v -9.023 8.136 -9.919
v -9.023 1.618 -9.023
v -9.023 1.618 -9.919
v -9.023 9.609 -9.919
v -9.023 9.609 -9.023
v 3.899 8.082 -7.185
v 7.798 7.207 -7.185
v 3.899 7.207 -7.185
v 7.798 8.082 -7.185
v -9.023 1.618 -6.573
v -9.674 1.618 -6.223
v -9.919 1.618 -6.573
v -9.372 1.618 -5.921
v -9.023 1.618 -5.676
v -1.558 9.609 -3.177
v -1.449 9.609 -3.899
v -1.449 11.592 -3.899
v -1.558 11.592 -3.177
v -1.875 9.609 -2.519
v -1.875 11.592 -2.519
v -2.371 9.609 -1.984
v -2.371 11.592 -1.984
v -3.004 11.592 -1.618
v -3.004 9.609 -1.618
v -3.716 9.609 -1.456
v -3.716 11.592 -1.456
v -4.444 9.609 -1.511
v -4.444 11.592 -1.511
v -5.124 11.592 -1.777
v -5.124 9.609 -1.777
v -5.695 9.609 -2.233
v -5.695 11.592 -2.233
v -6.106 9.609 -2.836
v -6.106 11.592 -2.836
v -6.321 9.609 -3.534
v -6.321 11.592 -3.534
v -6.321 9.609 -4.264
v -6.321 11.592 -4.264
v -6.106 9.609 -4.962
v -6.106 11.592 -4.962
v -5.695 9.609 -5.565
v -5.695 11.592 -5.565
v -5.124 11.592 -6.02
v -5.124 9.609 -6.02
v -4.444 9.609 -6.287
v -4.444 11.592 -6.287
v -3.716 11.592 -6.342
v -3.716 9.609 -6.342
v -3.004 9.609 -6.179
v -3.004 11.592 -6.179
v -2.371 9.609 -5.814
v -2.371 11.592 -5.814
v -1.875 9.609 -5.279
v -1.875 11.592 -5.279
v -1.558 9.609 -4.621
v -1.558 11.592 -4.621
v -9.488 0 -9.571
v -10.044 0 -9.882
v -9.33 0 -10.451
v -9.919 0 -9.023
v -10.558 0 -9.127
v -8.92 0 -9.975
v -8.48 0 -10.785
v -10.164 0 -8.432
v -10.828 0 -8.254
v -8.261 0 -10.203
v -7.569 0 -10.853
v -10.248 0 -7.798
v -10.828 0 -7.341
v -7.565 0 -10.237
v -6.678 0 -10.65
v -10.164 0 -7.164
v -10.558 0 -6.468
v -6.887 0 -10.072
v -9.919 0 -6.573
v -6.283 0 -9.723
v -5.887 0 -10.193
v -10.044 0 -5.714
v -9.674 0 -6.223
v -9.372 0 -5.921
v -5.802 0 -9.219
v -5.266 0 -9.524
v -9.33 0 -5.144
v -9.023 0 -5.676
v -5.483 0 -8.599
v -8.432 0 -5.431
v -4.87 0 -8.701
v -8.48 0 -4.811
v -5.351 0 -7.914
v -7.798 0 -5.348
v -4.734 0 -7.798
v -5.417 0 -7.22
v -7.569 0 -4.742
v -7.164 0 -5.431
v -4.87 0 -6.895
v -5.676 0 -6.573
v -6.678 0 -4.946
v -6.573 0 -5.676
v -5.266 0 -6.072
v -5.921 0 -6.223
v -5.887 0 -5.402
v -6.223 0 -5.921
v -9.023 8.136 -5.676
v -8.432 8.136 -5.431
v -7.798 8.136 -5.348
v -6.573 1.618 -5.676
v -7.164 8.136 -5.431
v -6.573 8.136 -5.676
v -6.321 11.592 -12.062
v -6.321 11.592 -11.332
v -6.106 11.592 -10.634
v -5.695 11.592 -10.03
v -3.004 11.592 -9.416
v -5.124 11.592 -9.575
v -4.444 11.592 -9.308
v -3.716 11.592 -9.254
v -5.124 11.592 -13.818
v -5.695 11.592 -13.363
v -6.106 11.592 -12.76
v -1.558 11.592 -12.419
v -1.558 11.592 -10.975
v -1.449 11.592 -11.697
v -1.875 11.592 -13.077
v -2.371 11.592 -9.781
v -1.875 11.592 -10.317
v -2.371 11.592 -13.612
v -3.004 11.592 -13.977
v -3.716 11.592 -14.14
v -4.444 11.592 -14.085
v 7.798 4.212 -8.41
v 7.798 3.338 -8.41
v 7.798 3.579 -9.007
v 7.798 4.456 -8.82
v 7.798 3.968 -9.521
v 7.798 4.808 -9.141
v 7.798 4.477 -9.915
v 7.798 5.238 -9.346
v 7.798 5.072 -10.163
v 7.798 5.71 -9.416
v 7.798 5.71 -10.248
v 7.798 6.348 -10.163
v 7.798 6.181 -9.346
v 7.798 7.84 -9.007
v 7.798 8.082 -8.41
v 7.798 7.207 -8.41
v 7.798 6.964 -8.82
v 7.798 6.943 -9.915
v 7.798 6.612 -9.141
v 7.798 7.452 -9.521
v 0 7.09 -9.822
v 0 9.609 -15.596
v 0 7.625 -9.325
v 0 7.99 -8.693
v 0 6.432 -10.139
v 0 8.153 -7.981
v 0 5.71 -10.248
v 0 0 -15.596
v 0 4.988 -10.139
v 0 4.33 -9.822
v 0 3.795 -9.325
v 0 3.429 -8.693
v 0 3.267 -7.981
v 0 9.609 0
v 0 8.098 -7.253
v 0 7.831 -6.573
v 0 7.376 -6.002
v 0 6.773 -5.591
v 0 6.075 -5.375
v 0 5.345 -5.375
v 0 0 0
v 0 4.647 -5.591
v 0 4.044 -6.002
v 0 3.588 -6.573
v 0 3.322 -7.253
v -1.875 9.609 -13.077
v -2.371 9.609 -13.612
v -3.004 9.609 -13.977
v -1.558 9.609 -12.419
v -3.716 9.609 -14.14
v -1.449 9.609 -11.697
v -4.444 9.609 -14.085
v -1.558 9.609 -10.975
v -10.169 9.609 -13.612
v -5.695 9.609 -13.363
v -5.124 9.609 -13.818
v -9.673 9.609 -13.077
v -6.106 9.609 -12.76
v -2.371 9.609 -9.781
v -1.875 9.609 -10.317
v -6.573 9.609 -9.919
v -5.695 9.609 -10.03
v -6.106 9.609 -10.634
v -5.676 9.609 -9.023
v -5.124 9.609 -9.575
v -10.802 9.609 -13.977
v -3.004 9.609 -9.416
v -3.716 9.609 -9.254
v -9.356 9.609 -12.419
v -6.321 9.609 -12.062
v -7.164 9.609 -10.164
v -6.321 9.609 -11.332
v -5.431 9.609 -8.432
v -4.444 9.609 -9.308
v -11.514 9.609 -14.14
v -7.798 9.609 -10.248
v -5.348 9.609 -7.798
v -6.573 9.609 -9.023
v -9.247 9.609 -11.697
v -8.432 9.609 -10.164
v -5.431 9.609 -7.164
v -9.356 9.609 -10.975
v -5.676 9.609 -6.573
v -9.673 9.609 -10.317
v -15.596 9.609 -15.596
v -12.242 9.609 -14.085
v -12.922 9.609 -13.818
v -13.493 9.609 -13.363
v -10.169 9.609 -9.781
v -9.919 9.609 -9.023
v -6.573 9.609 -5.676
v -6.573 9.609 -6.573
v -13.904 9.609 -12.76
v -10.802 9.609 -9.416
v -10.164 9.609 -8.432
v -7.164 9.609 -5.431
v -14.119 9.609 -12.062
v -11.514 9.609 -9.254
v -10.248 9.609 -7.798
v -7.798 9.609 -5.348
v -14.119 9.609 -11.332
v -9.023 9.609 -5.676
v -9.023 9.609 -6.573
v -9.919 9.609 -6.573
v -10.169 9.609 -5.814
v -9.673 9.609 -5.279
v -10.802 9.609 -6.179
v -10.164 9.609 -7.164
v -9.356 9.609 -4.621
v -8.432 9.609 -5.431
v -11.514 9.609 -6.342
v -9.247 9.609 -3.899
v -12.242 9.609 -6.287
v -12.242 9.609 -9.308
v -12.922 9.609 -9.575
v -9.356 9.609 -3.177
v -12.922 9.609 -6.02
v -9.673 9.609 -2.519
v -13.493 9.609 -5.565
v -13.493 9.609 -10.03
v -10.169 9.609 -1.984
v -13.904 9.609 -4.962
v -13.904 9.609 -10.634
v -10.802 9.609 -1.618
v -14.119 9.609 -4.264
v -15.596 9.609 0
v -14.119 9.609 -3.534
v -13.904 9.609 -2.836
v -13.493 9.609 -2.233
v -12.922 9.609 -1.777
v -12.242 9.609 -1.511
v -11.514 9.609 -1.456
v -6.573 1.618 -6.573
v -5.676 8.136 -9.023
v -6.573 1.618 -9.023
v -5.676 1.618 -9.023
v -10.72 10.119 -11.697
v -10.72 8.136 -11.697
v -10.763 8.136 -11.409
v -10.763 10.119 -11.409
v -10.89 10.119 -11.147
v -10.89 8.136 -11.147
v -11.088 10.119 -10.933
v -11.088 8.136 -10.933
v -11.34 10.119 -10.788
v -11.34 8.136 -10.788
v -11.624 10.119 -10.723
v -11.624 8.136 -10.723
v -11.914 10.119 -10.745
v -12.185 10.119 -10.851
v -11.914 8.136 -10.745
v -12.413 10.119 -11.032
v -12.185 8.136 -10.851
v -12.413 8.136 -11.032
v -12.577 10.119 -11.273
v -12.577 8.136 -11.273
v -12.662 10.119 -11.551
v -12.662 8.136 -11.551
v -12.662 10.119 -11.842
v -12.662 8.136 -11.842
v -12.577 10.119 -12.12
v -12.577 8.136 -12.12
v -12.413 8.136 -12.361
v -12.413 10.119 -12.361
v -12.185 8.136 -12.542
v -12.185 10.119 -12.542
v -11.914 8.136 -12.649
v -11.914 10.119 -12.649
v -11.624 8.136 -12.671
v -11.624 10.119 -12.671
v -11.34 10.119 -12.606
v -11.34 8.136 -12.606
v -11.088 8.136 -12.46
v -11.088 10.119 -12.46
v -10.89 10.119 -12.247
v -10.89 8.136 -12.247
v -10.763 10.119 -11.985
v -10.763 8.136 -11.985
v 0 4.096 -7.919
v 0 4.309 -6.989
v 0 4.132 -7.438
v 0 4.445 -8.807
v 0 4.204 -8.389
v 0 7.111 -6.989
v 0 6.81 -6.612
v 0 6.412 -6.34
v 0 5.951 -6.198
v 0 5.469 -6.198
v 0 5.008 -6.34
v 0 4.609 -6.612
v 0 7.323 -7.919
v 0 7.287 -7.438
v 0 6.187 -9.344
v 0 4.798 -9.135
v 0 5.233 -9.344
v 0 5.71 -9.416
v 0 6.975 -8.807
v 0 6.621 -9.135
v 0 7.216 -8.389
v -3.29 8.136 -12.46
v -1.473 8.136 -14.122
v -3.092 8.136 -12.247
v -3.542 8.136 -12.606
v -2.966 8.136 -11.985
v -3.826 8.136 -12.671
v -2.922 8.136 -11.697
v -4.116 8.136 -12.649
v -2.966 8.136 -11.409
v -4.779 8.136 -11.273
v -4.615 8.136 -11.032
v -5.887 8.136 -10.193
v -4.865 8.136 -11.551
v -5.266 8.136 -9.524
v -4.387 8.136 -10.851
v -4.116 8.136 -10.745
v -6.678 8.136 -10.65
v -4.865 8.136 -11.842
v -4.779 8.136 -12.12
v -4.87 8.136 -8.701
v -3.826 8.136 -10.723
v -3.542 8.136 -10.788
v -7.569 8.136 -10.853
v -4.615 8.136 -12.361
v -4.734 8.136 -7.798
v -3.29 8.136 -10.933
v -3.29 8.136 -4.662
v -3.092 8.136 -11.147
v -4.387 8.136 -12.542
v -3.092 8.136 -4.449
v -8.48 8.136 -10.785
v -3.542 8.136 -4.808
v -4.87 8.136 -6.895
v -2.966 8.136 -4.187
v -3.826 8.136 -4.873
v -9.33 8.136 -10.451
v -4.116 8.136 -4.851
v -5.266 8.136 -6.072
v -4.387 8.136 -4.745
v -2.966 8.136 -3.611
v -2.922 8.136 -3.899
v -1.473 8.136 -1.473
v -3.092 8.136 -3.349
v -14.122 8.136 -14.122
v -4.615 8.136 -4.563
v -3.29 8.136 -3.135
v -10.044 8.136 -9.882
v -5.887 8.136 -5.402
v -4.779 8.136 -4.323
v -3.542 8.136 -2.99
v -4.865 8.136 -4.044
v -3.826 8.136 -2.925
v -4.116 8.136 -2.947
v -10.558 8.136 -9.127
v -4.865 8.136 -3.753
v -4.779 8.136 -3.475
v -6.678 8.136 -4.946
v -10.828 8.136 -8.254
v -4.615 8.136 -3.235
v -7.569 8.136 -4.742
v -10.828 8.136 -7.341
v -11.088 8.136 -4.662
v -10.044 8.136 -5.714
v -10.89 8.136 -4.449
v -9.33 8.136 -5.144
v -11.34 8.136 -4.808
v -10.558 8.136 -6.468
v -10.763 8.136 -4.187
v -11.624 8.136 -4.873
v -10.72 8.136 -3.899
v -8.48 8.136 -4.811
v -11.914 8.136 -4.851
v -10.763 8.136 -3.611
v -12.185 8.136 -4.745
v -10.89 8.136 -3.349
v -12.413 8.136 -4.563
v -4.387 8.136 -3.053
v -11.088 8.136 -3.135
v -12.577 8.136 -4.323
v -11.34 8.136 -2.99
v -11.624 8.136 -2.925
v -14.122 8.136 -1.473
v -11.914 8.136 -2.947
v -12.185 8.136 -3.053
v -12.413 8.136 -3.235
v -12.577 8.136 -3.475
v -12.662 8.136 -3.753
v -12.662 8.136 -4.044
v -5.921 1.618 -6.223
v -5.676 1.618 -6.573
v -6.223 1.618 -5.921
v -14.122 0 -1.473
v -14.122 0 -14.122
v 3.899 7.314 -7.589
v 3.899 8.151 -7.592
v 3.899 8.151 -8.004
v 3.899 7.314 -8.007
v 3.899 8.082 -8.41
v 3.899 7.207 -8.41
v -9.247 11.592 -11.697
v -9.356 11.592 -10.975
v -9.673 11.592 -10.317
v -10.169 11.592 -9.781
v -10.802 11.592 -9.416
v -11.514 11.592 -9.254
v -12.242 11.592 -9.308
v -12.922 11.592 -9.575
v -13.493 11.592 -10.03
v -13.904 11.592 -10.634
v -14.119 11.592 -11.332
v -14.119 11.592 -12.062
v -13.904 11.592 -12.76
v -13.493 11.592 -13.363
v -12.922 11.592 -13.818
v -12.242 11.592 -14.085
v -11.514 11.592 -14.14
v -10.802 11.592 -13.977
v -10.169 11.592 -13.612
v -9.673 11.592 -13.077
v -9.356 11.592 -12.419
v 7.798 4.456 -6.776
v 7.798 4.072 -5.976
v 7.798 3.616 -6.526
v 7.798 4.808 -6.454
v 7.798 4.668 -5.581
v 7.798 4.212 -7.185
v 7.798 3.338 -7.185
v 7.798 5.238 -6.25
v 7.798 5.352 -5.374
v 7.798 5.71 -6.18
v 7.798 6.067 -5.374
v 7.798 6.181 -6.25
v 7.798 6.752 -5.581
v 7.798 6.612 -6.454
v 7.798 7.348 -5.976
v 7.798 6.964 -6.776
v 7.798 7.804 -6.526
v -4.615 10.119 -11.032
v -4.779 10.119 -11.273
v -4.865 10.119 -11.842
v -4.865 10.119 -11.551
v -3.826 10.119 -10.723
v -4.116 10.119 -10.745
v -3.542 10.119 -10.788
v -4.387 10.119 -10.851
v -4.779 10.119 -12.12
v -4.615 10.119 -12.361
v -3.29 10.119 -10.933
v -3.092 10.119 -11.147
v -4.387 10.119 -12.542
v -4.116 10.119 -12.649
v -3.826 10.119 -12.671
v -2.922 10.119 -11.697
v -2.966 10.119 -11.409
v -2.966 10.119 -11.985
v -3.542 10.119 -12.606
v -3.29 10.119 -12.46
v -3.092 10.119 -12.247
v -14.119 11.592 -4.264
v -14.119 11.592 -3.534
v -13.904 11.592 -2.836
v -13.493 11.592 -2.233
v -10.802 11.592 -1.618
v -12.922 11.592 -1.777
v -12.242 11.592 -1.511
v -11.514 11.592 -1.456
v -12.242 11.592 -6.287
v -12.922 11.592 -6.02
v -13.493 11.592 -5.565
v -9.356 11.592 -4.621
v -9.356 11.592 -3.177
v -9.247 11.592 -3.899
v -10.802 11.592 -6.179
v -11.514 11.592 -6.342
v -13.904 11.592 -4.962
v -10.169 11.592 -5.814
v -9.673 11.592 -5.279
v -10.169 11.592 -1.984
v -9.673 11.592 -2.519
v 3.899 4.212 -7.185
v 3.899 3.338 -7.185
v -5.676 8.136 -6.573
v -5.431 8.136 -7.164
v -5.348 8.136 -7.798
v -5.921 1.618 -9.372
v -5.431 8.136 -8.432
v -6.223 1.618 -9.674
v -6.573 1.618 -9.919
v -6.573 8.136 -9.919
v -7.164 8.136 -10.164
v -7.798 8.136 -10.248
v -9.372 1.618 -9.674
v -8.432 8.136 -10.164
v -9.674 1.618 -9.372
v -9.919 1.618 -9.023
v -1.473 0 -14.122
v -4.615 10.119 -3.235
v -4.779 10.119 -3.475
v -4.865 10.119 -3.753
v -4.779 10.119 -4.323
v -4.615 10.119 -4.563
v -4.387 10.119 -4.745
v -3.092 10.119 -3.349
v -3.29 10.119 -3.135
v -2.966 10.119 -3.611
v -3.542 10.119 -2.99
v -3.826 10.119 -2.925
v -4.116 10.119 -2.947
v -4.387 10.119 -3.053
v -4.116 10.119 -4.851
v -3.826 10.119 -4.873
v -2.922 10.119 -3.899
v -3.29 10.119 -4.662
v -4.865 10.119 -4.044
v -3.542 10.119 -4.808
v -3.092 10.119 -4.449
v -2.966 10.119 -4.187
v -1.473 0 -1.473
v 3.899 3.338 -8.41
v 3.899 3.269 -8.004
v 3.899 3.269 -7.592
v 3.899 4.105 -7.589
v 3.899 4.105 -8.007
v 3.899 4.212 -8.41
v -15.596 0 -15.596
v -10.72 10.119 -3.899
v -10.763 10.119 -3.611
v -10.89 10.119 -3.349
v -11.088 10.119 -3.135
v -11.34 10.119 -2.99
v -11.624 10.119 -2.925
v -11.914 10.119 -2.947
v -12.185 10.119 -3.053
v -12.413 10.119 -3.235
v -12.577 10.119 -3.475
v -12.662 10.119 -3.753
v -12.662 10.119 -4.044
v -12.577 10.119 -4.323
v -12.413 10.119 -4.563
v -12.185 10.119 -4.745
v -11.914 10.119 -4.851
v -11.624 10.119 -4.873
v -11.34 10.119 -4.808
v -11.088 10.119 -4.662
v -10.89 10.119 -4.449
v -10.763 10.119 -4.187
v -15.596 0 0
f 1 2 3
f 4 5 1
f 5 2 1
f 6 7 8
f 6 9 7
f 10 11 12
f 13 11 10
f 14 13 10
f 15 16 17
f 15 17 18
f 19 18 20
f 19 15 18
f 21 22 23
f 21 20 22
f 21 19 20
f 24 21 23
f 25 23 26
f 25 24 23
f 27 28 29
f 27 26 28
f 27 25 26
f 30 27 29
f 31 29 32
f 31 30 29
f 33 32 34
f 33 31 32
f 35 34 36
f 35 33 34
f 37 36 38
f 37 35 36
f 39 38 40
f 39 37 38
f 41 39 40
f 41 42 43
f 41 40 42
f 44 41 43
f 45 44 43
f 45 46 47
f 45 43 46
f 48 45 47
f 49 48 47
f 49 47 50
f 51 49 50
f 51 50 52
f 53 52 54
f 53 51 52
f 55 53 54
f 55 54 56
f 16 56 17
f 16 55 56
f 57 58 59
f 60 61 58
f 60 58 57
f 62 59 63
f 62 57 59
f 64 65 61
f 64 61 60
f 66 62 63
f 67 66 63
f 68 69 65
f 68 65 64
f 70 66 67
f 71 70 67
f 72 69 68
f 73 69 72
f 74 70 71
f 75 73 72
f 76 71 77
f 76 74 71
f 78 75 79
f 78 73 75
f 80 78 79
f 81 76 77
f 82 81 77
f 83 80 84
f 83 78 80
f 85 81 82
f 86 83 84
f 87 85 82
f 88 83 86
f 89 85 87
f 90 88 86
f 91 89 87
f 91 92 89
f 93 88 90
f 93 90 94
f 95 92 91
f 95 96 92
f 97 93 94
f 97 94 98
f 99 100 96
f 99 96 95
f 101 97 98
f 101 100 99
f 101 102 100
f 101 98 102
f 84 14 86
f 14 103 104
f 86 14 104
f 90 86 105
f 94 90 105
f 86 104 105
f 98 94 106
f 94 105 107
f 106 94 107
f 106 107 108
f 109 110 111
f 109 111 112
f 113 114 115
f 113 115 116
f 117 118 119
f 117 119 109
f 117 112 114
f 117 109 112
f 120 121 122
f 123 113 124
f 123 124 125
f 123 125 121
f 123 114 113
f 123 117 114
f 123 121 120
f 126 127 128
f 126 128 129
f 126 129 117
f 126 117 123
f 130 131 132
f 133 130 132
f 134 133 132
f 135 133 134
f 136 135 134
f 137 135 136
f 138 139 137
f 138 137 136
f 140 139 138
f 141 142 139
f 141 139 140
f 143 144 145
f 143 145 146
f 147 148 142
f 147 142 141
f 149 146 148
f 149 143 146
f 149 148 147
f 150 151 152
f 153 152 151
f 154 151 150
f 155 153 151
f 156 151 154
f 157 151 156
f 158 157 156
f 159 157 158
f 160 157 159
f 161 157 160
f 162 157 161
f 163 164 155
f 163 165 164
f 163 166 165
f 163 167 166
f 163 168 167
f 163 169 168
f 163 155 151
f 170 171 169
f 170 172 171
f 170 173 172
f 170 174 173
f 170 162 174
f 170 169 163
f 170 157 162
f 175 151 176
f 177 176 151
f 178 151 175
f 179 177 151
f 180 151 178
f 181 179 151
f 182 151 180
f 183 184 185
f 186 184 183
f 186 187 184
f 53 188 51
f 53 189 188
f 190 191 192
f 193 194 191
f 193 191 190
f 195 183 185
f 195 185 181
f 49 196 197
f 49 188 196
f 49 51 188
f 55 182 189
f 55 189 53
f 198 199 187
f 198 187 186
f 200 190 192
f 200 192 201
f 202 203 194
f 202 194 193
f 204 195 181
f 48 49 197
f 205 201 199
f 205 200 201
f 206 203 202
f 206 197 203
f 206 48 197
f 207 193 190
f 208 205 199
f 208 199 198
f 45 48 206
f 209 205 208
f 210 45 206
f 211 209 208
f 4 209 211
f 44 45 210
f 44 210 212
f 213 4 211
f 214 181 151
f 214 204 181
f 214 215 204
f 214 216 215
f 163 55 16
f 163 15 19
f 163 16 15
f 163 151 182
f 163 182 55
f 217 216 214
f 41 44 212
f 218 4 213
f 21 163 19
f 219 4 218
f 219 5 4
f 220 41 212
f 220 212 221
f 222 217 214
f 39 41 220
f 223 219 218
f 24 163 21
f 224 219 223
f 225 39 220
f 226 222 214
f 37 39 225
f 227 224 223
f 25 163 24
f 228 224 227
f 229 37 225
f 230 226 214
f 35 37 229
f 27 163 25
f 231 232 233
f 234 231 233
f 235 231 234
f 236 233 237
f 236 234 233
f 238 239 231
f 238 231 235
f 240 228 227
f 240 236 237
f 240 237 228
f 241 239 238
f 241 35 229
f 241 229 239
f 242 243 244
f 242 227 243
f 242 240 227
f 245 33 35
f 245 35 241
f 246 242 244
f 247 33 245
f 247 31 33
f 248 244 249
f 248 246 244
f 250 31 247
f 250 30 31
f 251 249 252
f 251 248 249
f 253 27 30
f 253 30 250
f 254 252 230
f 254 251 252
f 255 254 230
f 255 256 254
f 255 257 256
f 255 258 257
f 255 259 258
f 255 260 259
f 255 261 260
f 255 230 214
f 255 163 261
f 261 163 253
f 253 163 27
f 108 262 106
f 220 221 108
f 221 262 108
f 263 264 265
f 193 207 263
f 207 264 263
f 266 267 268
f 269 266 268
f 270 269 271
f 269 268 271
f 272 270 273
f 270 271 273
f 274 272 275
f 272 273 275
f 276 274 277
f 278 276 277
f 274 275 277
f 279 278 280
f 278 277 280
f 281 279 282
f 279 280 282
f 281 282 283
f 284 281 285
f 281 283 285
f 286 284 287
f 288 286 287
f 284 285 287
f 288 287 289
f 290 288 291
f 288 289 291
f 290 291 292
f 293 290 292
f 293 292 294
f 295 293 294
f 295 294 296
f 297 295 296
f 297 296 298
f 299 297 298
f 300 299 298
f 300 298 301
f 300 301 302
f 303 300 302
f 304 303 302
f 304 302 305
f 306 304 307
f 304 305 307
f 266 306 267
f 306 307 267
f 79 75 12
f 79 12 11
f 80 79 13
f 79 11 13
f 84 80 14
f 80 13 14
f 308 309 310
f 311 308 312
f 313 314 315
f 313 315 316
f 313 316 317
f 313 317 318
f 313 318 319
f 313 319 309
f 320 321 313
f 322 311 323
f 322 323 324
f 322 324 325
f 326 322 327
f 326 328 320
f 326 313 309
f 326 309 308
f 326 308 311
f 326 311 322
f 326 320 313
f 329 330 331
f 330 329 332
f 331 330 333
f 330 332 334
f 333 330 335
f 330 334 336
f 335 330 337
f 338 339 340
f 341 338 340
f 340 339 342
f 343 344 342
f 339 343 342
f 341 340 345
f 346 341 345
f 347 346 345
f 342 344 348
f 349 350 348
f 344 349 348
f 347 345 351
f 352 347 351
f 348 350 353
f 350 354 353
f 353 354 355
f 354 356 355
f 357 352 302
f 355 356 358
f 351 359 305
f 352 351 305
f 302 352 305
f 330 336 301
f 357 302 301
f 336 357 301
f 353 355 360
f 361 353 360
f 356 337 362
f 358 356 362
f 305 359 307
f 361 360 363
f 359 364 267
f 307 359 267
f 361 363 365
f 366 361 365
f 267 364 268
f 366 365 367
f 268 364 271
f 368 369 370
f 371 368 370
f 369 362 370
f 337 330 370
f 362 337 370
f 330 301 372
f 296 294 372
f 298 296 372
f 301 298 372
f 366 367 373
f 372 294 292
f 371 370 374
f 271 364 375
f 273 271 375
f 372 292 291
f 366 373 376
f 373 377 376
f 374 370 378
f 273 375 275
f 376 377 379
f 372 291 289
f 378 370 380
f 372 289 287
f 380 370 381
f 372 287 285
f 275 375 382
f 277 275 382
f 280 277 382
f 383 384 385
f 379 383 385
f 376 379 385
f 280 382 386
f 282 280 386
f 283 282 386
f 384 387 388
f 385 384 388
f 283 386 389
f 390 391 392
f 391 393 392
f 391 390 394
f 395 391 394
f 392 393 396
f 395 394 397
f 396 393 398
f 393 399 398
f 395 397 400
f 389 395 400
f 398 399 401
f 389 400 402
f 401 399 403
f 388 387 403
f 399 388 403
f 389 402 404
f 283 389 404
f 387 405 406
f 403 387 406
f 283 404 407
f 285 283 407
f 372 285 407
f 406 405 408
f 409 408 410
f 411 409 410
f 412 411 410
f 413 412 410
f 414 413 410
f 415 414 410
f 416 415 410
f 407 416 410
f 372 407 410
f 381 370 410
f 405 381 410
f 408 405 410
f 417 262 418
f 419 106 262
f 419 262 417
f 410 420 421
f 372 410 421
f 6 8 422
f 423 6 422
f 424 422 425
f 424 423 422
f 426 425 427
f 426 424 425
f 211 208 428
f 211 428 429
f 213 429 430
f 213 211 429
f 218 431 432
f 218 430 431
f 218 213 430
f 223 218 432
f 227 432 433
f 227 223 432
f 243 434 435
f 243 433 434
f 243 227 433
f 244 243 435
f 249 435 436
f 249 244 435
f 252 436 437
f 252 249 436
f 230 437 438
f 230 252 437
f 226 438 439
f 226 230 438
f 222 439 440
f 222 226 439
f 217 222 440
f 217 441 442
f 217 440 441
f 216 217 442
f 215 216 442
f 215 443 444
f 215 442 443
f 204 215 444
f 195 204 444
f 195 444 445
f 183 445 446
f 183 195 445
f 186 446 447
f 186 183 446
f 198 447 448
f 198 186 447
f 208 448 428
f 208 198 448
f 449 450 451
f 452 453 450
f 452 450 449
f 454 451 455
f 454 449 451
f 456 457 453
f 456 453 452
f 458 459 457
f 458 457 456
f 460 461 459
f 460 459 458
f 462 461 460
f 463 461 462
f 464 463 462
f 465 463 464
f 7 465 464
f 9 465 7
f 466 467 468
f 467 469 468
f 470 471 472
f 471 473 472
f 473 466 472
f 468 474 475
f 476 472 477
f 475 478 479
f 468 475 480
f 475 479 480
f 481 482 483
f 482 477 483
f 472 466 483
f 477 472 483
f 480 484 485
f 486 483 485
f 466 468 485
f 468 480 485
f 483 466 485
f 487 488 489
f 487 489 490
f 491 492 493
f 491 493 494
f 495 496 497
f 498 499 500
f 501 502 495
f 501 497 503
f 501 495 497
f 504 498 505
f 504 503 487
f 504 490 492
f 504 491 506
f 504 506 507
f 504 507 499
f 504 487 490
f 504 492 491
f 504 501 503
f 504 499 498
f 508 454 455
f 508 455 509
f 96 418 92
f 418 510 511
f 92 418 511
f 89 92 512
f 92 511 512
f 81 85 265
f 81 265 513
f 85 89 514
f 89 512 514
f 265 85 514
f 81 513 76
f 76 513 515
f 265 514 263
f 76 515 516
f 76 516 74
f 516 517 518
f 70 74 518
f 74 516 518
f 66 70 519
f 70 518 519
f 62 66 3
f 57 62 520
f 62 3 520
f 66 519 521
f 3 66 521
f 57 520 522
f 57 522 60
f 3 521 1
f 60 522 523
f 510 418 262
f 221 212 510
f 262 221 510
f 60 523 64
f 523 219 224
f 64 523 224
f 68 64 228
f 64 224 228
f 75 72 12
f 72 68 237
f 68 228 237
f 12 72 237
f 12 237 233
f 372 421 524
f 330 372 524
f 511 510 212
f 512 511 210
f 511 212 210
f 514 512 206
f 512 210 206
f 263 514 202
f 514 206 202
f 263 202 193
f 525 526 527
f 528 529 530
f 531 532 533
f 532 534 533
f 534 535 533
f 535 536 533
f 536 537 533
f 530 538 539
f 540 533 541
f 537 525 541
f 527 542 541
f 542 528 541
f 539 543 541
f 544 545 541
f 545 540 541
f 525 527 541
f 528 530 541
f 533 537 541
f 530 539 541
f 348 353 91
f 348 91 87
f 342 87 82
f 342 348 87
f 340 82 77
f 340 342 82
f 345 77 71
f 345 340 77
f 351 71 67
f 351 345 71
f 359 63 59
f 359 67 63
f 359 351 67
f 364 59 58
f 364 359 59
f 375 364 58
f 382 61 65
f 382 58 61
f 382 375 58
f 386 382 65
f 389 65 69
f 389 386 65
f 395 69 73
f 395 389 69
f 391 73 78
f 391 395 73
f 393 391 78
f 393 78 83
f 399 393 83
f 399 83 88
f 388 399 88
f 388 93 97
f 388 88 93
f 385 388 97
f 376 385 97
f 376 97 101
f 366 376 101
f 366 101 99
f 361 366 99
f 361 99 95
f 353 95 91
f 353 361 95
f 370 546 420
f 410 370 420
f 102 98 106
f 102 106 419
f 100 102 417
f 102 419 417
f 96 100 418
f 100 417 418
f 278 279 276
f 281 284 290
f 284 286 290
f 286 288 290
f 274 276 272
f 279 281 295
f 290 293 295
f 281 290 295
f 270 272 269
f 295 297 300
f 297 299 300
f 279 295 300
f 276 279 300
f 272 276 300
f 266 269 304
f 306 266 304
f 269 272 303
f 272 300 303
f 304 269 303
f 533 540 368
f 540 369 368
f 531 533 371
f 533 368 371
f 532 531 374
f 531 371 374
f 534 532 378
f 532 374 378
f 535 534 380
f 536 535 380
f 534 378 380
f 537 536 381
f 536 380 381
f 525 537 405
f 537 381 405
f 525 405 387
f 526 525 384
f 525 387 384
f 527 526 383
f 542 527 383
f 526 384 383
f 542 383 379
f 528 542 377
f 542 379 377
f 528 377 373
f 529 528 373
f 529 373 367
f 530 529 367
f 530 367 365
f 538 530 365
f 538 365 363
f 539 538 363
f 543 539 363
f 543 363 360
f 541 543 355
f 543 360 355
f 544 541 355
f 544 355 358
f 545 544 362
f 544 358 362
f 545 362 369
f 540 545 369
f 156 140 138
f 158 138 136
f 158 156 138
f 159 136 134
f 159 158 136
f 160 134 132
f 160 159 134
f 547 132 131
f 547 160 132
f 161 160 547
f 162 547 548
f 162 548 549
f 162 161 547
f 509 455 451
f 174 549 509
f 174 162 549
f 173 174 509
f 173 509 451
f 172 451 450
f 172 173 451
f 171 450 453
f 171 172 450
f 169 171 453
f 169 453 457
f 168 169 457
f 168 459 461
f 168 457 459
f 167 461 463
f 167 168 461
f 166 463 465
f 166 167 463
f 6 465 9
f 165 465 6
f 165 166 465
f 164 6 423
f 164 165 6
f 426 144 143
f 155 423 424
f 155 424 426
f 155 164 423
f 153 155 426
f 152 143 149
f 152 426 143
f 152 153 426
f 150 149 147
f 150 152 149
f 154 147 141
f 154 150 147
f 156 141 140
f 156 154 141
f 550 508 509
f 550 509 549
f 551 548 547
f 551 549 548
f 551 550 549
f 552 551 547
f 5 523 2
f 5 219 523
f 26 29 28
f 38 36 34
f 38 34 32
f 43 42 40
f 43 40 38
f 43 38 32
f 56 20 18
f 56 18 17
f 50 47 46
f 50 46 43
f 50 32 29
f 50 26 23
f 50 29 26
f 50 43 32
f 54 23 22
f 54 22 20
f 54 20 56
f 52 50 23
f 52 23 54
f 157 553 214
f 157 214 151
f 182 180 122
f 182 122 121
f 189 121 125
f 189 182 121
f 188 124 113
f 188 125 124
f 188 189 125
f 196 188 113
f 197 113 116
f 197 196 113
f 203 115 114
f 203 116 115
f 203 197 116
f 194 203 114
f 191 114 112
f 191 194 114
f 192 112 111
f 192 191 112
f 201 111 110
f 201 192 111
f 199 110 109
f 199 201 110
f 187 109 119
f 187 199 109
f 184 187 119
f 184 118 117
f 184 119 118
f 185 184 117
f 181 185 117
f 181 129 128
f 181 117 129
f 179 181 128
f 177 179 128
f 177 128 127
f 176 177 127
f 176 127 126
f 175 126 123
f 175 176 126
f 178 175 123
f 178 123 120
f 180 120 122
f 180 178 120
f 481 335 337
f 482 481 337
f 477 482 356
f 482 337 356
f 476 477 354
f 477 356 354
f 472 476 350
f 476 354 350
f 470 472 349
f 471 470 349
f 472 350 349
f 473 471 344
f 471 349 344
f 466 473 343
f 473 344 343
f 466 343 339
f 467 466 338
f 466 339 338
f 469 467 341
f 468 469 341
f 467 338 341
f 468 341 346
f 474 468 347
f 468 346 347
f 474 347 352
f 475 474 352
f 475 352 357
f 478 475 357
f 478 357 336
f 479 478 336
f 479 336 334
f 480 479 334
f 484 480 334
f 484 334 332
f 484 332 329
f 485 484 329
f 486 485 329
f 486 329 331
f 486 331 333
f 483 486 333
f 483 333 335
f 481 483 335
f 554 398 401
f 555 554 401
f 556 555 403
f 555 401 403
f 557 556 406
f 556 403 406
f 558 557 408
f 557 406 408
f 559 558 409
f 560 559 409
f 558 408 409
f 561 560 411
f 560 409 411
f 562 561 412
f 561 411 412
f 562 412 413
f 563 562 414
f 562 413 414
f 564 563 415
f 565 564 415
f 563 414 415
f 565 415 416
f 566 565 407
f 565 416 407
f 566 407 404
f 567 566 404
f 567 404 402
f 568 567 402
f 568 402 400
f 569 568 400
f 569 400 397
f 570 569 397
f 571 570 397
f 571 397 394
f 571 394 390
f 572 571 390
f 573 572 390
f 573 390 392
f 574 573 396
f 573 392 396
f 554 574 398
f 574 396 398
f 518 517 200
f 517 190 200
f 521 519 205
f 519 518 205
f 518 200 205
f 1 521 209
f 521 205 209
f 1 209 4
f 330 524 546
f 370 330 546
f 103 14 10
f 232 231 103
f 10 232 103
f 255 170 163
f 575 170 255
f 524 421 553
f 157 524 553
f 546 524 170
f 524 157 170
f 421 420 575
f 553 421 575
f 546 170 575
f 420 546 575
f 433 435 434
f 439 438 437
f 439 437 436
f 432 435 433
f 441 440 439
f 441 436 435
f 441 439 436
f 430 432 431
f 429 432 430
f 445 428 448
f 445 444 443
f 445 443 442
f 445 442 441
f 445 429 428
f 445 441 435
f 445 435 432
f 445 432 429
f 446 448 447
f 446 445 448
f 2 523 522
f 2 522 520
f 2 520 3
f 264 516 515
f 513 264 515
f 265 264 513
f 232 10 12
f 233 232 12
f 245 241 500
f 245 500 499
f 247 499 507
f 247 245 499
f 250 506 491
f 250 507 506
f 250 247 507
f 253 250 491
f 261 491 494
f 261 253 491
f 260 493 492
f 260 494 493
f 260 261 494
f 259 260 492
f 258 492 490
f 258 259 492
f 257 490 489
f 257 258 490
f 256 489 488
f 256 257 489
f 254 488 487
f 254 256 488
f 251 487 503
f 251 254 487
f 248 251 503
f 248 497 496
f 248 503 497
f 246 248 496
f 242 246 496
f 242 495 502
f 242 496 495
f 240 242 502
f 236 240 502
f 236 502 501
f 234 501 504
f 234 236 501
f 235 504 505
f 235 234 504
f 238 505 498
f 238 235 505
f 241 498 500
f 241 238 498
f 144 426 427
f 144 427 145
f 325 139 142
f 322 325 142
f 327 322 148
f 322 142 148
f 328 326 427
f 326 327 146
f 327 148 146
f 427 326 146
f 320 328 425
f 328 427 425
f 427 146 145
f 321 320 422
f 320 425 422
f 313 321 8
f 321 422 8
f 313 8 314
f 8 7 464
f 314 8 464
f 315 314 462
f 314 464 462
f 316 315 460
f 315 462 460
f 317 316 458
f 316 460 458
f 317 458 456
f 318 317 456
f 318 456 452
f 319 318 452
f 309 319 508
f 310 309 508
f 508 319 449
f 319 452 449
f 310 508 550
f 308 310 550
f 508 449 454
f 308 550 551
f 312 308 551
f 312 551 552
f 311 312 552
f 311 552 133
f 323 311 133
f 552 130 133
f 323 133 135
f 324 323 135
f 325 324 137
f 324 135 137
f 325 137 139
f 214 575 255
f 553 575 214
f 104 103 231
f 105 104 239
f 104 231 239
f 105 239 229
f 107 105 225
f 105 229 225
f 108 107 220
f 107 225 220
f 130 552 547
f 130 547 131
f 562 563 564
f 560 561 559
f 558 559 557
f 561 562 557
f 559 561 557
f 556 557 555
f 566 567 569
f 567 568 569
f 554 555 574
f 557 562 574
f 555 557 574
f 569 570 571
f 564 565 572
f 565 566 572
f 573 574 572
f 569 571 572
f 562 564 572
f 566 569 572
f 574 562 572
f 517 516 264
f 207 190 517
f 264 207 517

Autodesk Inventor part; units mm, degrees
ref_plane "YZ Plane" through (0, 0, 0) normal (1, 0, 0) x (0, 1, 0)
ref_plane "XZ Plane" through (0, 0, 0) normal (0, 1, 0) x (-1, 0, 0)
sketch "Sketch1" plane through (0, 0, 0) normal (0, 1, 0) x (-1, 0, 0)
  line L0 (0, 0) -> (15.5956, 0)
  line L1 (15.5956, 0) -> (15.5956, -15.5956)
  line L2 (15.5956, -15.5956) -> (0, -15.5956)
  line L3 (0, -15.5956) -> (0, 0)
  dimension "d0" = 15.5956
  dimension "d8" = 15.5956
extrude "Extrusion1" add sketch "Sketch1" along normal blind 9.6088
sketch "Sketch2" plane through (0, 9.6088, 0) normal (0, 1, 0) x (1, 0, 0)
  line L0 (0, 0) -> (-3.8989, 0) construction
  line L1 (-3.8989, 0) -> (-3.8989, 3.8989) construction
  line L2 (-3.8989, 3.8989) -> (0, 3.8989) construction
  line L3 (0, 3.8989) -> (0, 0) construction
  circle A0 centre (-3.8989, 3.8989) radius 2.4498
  dimension "d11" = 3.8989
  dimension "d12" = 3.8989
  dimension "d13" = 4.8997
extrude "Extrusion2" add sketch "Sketch2" along normal blind 1.9837
pattern_linear "Rectangular Pattern1" count 2 spacing 7.7978 along (0, 0, -1) count 2 spacing 7.7978 along (-1, 0, 0) of "Extrusion2"
shell "Shell1" thickness 1.4732 removed faces 1 at (-5.1985, 0, -5.1985)
sketch "Sketch3" plane through (-14.1224, 8.1356, -1.4732) normal (0, -1, 0) x (1, 0, 0)
  circle A0 centre (2.4257, -2.4257) radius 2.4498 construction
  circle A1 centre (10.2235, -10.2235) radius 2.4498 construction
  line L0 (2.4257, -2.4257) -> (10.2235, -10.2235) construction
  circle A2 centre (6.3246, -6.3246) radius 3.064
  circle A3 centre (6.3246, -6.3246) radius 2.4498
  point P0 (14.1224, 1.4732)
  dimension "d23" = 4.8997
extrude "Extrusion3" add sketch "Sketch3" along normal up to surface (8.1356 mm away)
sketch "Sketch4" plane through (0, 9.6088, 0) normal (0, 1, 0) x (1, 0, 0)
  circle A0 centre (-7.7978, 7.7978) radius 2.4498 construction
  circle A1 centre (-7.7978, 7.7978) radius 2.4498 construction
  line L0 (-9.0227, 5.6762) -> (-6.5729, 5.6762) construction
  line L1 (-6.5729, 5.6762) -> (-6.5729, 9.9194) construction
  line L2 (-6.5729, 9.9194) -> (-9.0227, 9.9194) construction
  line L3 (-9.0227, 9.9194) -> (-9.0227, 5.6762) construction
  line L4 (-9.0227, 5.6762) -> (-6.5729, 9.9194) construction
  line L5 (-6.5729, 5.6762) -> (-9.0227, 9.9194) construction
  line L6 (-9.9194, 9.0227) -> (-5.6762, 9.0227) construction
  line L7 (-5.6762, 9.0227) -> (-5.6762, 6.5729) construction
  line L8 (-5.6762, 6.5729) -> (-9.9194, 6.5729) construction
  line L9 (-9.9194, 6.5729) -> (-9.9194, 9.0227) construction
  line L10 (-9.9194, 9.0227) -> (-5.6762, 6.5729) construction
  line L11 (-5.6762, 9.0227) -> (-9.9194, 6.5729) construction
  line L12 (-9.0227, 9.0227) -> (-9.0227, 9.9194)
  line L13 (-6.5729, 9.9194) -> (-6.5729, 9.0227)
  line L14 (-6.5729, 9.0227) -> (-5.6762, 9.0227)
  line L15 (-5.6762, 6.5729) -> (-6.5729, 6.5729)
  line L16 (-6.5729, 6.5729) -> (-6.5729, 5.6762)
  line L17 (-9.0227, 5.6762) -> (-9.0227, 6.5729)
  line L18 (-9.0227, 6.5729) -> (-9.9194, 6.5729)
  line L19 (-9.9194, 9.0227) -> (-9.0227, 9.0227)
  arc A2 (-9.9194, 9.0227) -> (-9.9194, 6.5729) centre (-7.7978, 7.7978) ccw
  arc A3 (-6.5729, 9.9194) -> (-9.0227, 9.9194) centre (-7.7978, 7.7978) ccw
  arc A4 (-5.6762, 6.5729) -> (-5.6762, 9.0227) centre (-7.7978, 7.7978) ccw
  arc A5 (-9.0227, 5.6762) -> (-6.5729, 5.6762) centre (-7.7978, 7.7978) ccw
  point P0 (0, 0)
  dimension "d26" = 2.4498
  dimension "d27" = 2.4498
extrude "Extrusion4" cut sketch "Sketch4" against normal through all
sketch "Sketch5" plane through (0, 0, 0) normal (1, 0, 0) x (0, 0, -1)
  line L0 (0, 9.6088) -> (7.7978, 9.6088) construction
  line L1 (7.7978, 9.6088) -> (7.7978, 5.7099) construction
  line L2 (7.7978, 5.7099) -> (0, 5.7099) construction
  line L3 (0, 5.7099) -> (0, 9.6088) construction
  circle A0 centre (7.7978, 5.7099) radius 2.4498
  point P0 (0, 0)
  dimension "d30" = 7.7978
  dimension "d31" = 3.8989
  dimension "d32" = 4.8997
extrude "Extrusion5" add sketch "Sketch5" along normal blind 7.7978
sketch "Sketch6" plane through (7.7978, 5.7099, -7.7978) normal (1, 0, 0) x (0, 0, -1)
  circle A0 centre (0, 0) radius 2.4498 construction
  circle A1 centre (0, 0) radius 1.618
  point P0 (-7.7978, -5.7099)
  dimension "d35" = 3.236
extrude "Extrusion6" cut sketch "Sketch6" against normal blind 7.7978
sketch "Sketch7" plane through (-6.5729, 8.1356, -9.0227) normal (0, -1, 0) x (1, 0, 0)
  line L0 (-2.4498, 2.4498) -> (-2.4498, 3.3465) construction
  arc A0 (-2.4498, 3.3465) -> (-3.3465, 2.4498) centre (-1.2249, 1.2249) ccw construction
  line L1 (-3.3465, 2.4498) -> (-2.4498, 2.4498) construction
  line L2 (0, 2.4498) -> (0.8967, 2.4498) construction
  arc A1 (0.8967, 2.4498) -> (0, 3.3465) centre (-1.2249, 1.2249) ccw construction
  line L3 (0, 3.3465) -> (0, 2.4498) construction
  line L4 (0.8967, 0) -> (0, 0) construction
  line L5 (0, 0) -> (0, -0.8967) construction
  arc A2 (0, -0.8967) -> (0.8967, 0) centre (-1.2249, 1.2249) ccw construction
  line L6 (-2.4498, -0.8967) -> (-2.4498, 0) construction
  line L7 (-2.4498, 0) -> (-3.3465, 0) construction
  arc A3 (-3.3465, 0) -> (-2.4498, -0.8967) centre (-1.2249, 1.2249) ccw construction
  arc A4 (-2.4498, 3.3465) -> (-3.3465, 2.4498) centre (-1.2249, 1.2249) ccw
  arc A5 (0.8967, 0) -> (0.8967, 2.4498) centre (-1.2249, 1.2249) ccw projected
  arc A6 (0.8967, 2.4498) -> (0, 3.3465) centre (-1.2249, 1.2249) ccw
  arc A7 (-2.4498, -0.8967) -> (0, -0.8967) centre (-1.2249, 1.2249) ccw projected
  arc A8 (0, -0.8967) -> (0.8967, 0) centre (-1.2249, 1.2249) ccw
  arc A9 (-3.3465, 0) -> (-2.4498, -0.8967) centre (-1.2249, 1.2249) ccw
  line L8 (-2.4498, 3.3465) -> (-2.4498, 2.4498)
  line L9 (-2.4498, 2.4498) -> (-3.3465, 2.4498) projected
  line L10 (-2.4498, 2.4498) -> (-3.3465, 2.4498)
  line L11 (0, 2.4498) -> (0, 3.3465) projected
  line L12 (0, 3.3465) -> (0, 2.4498)
  line L13 (0, 2.4498) -> (0.8967, 2.4498)
  line L14 (0, 0) -> (0.8967, 0) projected
  line L15 (0.8967, 0) -> (0, 0)
  line L16 (0, 0) -> (0, -0.8967)
  line L17 (-2.4498, 0) -> (-2.4498, -0.8967) projected
  line L18 (-2.4498, -0.8967) -> (-2.4498, 0)
  arc A10 (-3.3465, 2.4498) -> (-3.3465, 0) centre (-1.2249, 1.2249) ccw projected
  line L19 (-2.4498, 0) -> (-3.3465, 0)
  point P0 (6.5729, 9.0227)
extrude "Extrusion7" add sketch "Sketch7" along normal up to surface (8.1356 mm away)
sketch "Sketch8" plane through (-7.7978, 0, -7.7978) normal (0, -1, 0) x (1, 0, 0)
  arc A0 (2.1216, -1.2249) -> (2.1216, 1.2249) centre (0, 0) ccw construction
  line L0 (2.1216, -1.2249) -> (1.2249, -1.2249) construction
  line L1 (1.2249, -1.2249) -> (1.2249, -2.1216) construction
  arc A1 (-1.2249, -2.1216) -> (1.2249, -2.1216) centre (0, 0) ccw construction
  line L2 (-1.2249, -2.1216) -> (-1.2249, -1.2249) construction
  line L3 (-1.2249, -1.2249) -> (-2.1216, -1.2249) construction
  arc A2 (-2.1216, 1.2249) -> (-2.1216, -1.2249) centre (0, 0) ccw construction
  line L4 (-2.1216, 1.2249) -> (-1.2249, 1.2249) construction
  line L5 (-1.2249, 1.2249) -> (-1.2249, 2.1216) construction
  arc A3 (1.2249, 2.1216) -> (-1.2249, 2.1216) centre (0, 0) ccw construction
  line L6 (1.2249, 2.1216) -> (1.2249, 1.2249) construction
  line L7 (1.2249, 1.2249) -> (2.1216, 1.2249) construction
  circle A4 centre (0, 0) radius 3.064 construction
  circle A5 centre (0, 0) radius 2.4498
  point P0 (7.7978, 7.7978)
extrude "Extrusion8" cut sketch "Sketch8" against normal blind 1.618
ref_plane "Work Plane1" through (0, 8.1598, -7.7978) normal (0, 1, 0) x (-1, 0, 0)
sketch "Sketch9" plane through (0, 8.1598, -7.7978) normal (0, 1, 0) x (-1, 0, 0)
  line L0 (-7.7978, 2.4498) -> (-7.7978, -2.4498) construction
  line L1 (-7.7978, 0) -> (-7.7978, 0.6125) construction
  line L2 (-7.7978, 0) -> (-7.1853, 0) construction
  line L3 (-7.7978, 0.6125) -> (-3.8989, 0.6125)
  line L4 (-3.8989, 0.6125) -> (-3.8989, -0.6125)
  line L5 (-3.8989, -0.6125) -> (-7.7978, -0.6125)
  line L6 (-7.7978, -0.6125) -> (-7.7978, 0.6125)
  point P0 (0, 7.7978)
  dimension "d42" = 0.6125
  dimension "d43" = 90
  dimension "d44" = 3.8989
  dimension "d45" = 1.2249
extrude "Extrusion9" cut sketch "Sketch9" against normal through all
equation "\"d0\" = 2 * d1"
equation "\"d8\" = 2 * d1"
equation "\"d9\" = d3"
equation "\"d11\" = 0.5 * d1"
equation "\"d12\" = 0.5 * d1"
equation "\"d13\" = d4"
equation "\"d14\" = d5"
equation "\"d18\" = d1"
equation "\"d21\" = d1"
equation "\"d22\" = d6"
equation "\"d23\" = d4"
equation "\"d24\" = d5"
equation "\"d26\" = 0.5 * d4"
equation "\"d27\" = 0.5 * d4"
equation "\"d28\" = d5"
equation "\"d30\" = d1"
equation "\"d31\" = 0.5 * d1"
equation "\"d32\" = d4"
equation "\"d33\" = d1"
equation "\"d35\" = d2"
equation "\"d36\" = d1"
equation "\"d40\" = 0.5 * d2"
equation "\"d42\" = 0.125 * d4"
equation "\"d44\" = 0.5 * d1"
equation "\"d45\" = 0.25 * d4"
equation "\"d46\" = 0.5 * d2"
equation "\"d1\" = 7.7978"
equation "\"d2\" = 3.23596"
equation "\"d3\" = 9.60882"
equation "\"d4\" = 4.89966"
equation "\"d5\" = 1.98374"
equation "\"d6\" = 1.4732"
equation "\"d7\" = 1.23952"
properties part number "2x2 tall things sticking out" material "ABS Plastic"
